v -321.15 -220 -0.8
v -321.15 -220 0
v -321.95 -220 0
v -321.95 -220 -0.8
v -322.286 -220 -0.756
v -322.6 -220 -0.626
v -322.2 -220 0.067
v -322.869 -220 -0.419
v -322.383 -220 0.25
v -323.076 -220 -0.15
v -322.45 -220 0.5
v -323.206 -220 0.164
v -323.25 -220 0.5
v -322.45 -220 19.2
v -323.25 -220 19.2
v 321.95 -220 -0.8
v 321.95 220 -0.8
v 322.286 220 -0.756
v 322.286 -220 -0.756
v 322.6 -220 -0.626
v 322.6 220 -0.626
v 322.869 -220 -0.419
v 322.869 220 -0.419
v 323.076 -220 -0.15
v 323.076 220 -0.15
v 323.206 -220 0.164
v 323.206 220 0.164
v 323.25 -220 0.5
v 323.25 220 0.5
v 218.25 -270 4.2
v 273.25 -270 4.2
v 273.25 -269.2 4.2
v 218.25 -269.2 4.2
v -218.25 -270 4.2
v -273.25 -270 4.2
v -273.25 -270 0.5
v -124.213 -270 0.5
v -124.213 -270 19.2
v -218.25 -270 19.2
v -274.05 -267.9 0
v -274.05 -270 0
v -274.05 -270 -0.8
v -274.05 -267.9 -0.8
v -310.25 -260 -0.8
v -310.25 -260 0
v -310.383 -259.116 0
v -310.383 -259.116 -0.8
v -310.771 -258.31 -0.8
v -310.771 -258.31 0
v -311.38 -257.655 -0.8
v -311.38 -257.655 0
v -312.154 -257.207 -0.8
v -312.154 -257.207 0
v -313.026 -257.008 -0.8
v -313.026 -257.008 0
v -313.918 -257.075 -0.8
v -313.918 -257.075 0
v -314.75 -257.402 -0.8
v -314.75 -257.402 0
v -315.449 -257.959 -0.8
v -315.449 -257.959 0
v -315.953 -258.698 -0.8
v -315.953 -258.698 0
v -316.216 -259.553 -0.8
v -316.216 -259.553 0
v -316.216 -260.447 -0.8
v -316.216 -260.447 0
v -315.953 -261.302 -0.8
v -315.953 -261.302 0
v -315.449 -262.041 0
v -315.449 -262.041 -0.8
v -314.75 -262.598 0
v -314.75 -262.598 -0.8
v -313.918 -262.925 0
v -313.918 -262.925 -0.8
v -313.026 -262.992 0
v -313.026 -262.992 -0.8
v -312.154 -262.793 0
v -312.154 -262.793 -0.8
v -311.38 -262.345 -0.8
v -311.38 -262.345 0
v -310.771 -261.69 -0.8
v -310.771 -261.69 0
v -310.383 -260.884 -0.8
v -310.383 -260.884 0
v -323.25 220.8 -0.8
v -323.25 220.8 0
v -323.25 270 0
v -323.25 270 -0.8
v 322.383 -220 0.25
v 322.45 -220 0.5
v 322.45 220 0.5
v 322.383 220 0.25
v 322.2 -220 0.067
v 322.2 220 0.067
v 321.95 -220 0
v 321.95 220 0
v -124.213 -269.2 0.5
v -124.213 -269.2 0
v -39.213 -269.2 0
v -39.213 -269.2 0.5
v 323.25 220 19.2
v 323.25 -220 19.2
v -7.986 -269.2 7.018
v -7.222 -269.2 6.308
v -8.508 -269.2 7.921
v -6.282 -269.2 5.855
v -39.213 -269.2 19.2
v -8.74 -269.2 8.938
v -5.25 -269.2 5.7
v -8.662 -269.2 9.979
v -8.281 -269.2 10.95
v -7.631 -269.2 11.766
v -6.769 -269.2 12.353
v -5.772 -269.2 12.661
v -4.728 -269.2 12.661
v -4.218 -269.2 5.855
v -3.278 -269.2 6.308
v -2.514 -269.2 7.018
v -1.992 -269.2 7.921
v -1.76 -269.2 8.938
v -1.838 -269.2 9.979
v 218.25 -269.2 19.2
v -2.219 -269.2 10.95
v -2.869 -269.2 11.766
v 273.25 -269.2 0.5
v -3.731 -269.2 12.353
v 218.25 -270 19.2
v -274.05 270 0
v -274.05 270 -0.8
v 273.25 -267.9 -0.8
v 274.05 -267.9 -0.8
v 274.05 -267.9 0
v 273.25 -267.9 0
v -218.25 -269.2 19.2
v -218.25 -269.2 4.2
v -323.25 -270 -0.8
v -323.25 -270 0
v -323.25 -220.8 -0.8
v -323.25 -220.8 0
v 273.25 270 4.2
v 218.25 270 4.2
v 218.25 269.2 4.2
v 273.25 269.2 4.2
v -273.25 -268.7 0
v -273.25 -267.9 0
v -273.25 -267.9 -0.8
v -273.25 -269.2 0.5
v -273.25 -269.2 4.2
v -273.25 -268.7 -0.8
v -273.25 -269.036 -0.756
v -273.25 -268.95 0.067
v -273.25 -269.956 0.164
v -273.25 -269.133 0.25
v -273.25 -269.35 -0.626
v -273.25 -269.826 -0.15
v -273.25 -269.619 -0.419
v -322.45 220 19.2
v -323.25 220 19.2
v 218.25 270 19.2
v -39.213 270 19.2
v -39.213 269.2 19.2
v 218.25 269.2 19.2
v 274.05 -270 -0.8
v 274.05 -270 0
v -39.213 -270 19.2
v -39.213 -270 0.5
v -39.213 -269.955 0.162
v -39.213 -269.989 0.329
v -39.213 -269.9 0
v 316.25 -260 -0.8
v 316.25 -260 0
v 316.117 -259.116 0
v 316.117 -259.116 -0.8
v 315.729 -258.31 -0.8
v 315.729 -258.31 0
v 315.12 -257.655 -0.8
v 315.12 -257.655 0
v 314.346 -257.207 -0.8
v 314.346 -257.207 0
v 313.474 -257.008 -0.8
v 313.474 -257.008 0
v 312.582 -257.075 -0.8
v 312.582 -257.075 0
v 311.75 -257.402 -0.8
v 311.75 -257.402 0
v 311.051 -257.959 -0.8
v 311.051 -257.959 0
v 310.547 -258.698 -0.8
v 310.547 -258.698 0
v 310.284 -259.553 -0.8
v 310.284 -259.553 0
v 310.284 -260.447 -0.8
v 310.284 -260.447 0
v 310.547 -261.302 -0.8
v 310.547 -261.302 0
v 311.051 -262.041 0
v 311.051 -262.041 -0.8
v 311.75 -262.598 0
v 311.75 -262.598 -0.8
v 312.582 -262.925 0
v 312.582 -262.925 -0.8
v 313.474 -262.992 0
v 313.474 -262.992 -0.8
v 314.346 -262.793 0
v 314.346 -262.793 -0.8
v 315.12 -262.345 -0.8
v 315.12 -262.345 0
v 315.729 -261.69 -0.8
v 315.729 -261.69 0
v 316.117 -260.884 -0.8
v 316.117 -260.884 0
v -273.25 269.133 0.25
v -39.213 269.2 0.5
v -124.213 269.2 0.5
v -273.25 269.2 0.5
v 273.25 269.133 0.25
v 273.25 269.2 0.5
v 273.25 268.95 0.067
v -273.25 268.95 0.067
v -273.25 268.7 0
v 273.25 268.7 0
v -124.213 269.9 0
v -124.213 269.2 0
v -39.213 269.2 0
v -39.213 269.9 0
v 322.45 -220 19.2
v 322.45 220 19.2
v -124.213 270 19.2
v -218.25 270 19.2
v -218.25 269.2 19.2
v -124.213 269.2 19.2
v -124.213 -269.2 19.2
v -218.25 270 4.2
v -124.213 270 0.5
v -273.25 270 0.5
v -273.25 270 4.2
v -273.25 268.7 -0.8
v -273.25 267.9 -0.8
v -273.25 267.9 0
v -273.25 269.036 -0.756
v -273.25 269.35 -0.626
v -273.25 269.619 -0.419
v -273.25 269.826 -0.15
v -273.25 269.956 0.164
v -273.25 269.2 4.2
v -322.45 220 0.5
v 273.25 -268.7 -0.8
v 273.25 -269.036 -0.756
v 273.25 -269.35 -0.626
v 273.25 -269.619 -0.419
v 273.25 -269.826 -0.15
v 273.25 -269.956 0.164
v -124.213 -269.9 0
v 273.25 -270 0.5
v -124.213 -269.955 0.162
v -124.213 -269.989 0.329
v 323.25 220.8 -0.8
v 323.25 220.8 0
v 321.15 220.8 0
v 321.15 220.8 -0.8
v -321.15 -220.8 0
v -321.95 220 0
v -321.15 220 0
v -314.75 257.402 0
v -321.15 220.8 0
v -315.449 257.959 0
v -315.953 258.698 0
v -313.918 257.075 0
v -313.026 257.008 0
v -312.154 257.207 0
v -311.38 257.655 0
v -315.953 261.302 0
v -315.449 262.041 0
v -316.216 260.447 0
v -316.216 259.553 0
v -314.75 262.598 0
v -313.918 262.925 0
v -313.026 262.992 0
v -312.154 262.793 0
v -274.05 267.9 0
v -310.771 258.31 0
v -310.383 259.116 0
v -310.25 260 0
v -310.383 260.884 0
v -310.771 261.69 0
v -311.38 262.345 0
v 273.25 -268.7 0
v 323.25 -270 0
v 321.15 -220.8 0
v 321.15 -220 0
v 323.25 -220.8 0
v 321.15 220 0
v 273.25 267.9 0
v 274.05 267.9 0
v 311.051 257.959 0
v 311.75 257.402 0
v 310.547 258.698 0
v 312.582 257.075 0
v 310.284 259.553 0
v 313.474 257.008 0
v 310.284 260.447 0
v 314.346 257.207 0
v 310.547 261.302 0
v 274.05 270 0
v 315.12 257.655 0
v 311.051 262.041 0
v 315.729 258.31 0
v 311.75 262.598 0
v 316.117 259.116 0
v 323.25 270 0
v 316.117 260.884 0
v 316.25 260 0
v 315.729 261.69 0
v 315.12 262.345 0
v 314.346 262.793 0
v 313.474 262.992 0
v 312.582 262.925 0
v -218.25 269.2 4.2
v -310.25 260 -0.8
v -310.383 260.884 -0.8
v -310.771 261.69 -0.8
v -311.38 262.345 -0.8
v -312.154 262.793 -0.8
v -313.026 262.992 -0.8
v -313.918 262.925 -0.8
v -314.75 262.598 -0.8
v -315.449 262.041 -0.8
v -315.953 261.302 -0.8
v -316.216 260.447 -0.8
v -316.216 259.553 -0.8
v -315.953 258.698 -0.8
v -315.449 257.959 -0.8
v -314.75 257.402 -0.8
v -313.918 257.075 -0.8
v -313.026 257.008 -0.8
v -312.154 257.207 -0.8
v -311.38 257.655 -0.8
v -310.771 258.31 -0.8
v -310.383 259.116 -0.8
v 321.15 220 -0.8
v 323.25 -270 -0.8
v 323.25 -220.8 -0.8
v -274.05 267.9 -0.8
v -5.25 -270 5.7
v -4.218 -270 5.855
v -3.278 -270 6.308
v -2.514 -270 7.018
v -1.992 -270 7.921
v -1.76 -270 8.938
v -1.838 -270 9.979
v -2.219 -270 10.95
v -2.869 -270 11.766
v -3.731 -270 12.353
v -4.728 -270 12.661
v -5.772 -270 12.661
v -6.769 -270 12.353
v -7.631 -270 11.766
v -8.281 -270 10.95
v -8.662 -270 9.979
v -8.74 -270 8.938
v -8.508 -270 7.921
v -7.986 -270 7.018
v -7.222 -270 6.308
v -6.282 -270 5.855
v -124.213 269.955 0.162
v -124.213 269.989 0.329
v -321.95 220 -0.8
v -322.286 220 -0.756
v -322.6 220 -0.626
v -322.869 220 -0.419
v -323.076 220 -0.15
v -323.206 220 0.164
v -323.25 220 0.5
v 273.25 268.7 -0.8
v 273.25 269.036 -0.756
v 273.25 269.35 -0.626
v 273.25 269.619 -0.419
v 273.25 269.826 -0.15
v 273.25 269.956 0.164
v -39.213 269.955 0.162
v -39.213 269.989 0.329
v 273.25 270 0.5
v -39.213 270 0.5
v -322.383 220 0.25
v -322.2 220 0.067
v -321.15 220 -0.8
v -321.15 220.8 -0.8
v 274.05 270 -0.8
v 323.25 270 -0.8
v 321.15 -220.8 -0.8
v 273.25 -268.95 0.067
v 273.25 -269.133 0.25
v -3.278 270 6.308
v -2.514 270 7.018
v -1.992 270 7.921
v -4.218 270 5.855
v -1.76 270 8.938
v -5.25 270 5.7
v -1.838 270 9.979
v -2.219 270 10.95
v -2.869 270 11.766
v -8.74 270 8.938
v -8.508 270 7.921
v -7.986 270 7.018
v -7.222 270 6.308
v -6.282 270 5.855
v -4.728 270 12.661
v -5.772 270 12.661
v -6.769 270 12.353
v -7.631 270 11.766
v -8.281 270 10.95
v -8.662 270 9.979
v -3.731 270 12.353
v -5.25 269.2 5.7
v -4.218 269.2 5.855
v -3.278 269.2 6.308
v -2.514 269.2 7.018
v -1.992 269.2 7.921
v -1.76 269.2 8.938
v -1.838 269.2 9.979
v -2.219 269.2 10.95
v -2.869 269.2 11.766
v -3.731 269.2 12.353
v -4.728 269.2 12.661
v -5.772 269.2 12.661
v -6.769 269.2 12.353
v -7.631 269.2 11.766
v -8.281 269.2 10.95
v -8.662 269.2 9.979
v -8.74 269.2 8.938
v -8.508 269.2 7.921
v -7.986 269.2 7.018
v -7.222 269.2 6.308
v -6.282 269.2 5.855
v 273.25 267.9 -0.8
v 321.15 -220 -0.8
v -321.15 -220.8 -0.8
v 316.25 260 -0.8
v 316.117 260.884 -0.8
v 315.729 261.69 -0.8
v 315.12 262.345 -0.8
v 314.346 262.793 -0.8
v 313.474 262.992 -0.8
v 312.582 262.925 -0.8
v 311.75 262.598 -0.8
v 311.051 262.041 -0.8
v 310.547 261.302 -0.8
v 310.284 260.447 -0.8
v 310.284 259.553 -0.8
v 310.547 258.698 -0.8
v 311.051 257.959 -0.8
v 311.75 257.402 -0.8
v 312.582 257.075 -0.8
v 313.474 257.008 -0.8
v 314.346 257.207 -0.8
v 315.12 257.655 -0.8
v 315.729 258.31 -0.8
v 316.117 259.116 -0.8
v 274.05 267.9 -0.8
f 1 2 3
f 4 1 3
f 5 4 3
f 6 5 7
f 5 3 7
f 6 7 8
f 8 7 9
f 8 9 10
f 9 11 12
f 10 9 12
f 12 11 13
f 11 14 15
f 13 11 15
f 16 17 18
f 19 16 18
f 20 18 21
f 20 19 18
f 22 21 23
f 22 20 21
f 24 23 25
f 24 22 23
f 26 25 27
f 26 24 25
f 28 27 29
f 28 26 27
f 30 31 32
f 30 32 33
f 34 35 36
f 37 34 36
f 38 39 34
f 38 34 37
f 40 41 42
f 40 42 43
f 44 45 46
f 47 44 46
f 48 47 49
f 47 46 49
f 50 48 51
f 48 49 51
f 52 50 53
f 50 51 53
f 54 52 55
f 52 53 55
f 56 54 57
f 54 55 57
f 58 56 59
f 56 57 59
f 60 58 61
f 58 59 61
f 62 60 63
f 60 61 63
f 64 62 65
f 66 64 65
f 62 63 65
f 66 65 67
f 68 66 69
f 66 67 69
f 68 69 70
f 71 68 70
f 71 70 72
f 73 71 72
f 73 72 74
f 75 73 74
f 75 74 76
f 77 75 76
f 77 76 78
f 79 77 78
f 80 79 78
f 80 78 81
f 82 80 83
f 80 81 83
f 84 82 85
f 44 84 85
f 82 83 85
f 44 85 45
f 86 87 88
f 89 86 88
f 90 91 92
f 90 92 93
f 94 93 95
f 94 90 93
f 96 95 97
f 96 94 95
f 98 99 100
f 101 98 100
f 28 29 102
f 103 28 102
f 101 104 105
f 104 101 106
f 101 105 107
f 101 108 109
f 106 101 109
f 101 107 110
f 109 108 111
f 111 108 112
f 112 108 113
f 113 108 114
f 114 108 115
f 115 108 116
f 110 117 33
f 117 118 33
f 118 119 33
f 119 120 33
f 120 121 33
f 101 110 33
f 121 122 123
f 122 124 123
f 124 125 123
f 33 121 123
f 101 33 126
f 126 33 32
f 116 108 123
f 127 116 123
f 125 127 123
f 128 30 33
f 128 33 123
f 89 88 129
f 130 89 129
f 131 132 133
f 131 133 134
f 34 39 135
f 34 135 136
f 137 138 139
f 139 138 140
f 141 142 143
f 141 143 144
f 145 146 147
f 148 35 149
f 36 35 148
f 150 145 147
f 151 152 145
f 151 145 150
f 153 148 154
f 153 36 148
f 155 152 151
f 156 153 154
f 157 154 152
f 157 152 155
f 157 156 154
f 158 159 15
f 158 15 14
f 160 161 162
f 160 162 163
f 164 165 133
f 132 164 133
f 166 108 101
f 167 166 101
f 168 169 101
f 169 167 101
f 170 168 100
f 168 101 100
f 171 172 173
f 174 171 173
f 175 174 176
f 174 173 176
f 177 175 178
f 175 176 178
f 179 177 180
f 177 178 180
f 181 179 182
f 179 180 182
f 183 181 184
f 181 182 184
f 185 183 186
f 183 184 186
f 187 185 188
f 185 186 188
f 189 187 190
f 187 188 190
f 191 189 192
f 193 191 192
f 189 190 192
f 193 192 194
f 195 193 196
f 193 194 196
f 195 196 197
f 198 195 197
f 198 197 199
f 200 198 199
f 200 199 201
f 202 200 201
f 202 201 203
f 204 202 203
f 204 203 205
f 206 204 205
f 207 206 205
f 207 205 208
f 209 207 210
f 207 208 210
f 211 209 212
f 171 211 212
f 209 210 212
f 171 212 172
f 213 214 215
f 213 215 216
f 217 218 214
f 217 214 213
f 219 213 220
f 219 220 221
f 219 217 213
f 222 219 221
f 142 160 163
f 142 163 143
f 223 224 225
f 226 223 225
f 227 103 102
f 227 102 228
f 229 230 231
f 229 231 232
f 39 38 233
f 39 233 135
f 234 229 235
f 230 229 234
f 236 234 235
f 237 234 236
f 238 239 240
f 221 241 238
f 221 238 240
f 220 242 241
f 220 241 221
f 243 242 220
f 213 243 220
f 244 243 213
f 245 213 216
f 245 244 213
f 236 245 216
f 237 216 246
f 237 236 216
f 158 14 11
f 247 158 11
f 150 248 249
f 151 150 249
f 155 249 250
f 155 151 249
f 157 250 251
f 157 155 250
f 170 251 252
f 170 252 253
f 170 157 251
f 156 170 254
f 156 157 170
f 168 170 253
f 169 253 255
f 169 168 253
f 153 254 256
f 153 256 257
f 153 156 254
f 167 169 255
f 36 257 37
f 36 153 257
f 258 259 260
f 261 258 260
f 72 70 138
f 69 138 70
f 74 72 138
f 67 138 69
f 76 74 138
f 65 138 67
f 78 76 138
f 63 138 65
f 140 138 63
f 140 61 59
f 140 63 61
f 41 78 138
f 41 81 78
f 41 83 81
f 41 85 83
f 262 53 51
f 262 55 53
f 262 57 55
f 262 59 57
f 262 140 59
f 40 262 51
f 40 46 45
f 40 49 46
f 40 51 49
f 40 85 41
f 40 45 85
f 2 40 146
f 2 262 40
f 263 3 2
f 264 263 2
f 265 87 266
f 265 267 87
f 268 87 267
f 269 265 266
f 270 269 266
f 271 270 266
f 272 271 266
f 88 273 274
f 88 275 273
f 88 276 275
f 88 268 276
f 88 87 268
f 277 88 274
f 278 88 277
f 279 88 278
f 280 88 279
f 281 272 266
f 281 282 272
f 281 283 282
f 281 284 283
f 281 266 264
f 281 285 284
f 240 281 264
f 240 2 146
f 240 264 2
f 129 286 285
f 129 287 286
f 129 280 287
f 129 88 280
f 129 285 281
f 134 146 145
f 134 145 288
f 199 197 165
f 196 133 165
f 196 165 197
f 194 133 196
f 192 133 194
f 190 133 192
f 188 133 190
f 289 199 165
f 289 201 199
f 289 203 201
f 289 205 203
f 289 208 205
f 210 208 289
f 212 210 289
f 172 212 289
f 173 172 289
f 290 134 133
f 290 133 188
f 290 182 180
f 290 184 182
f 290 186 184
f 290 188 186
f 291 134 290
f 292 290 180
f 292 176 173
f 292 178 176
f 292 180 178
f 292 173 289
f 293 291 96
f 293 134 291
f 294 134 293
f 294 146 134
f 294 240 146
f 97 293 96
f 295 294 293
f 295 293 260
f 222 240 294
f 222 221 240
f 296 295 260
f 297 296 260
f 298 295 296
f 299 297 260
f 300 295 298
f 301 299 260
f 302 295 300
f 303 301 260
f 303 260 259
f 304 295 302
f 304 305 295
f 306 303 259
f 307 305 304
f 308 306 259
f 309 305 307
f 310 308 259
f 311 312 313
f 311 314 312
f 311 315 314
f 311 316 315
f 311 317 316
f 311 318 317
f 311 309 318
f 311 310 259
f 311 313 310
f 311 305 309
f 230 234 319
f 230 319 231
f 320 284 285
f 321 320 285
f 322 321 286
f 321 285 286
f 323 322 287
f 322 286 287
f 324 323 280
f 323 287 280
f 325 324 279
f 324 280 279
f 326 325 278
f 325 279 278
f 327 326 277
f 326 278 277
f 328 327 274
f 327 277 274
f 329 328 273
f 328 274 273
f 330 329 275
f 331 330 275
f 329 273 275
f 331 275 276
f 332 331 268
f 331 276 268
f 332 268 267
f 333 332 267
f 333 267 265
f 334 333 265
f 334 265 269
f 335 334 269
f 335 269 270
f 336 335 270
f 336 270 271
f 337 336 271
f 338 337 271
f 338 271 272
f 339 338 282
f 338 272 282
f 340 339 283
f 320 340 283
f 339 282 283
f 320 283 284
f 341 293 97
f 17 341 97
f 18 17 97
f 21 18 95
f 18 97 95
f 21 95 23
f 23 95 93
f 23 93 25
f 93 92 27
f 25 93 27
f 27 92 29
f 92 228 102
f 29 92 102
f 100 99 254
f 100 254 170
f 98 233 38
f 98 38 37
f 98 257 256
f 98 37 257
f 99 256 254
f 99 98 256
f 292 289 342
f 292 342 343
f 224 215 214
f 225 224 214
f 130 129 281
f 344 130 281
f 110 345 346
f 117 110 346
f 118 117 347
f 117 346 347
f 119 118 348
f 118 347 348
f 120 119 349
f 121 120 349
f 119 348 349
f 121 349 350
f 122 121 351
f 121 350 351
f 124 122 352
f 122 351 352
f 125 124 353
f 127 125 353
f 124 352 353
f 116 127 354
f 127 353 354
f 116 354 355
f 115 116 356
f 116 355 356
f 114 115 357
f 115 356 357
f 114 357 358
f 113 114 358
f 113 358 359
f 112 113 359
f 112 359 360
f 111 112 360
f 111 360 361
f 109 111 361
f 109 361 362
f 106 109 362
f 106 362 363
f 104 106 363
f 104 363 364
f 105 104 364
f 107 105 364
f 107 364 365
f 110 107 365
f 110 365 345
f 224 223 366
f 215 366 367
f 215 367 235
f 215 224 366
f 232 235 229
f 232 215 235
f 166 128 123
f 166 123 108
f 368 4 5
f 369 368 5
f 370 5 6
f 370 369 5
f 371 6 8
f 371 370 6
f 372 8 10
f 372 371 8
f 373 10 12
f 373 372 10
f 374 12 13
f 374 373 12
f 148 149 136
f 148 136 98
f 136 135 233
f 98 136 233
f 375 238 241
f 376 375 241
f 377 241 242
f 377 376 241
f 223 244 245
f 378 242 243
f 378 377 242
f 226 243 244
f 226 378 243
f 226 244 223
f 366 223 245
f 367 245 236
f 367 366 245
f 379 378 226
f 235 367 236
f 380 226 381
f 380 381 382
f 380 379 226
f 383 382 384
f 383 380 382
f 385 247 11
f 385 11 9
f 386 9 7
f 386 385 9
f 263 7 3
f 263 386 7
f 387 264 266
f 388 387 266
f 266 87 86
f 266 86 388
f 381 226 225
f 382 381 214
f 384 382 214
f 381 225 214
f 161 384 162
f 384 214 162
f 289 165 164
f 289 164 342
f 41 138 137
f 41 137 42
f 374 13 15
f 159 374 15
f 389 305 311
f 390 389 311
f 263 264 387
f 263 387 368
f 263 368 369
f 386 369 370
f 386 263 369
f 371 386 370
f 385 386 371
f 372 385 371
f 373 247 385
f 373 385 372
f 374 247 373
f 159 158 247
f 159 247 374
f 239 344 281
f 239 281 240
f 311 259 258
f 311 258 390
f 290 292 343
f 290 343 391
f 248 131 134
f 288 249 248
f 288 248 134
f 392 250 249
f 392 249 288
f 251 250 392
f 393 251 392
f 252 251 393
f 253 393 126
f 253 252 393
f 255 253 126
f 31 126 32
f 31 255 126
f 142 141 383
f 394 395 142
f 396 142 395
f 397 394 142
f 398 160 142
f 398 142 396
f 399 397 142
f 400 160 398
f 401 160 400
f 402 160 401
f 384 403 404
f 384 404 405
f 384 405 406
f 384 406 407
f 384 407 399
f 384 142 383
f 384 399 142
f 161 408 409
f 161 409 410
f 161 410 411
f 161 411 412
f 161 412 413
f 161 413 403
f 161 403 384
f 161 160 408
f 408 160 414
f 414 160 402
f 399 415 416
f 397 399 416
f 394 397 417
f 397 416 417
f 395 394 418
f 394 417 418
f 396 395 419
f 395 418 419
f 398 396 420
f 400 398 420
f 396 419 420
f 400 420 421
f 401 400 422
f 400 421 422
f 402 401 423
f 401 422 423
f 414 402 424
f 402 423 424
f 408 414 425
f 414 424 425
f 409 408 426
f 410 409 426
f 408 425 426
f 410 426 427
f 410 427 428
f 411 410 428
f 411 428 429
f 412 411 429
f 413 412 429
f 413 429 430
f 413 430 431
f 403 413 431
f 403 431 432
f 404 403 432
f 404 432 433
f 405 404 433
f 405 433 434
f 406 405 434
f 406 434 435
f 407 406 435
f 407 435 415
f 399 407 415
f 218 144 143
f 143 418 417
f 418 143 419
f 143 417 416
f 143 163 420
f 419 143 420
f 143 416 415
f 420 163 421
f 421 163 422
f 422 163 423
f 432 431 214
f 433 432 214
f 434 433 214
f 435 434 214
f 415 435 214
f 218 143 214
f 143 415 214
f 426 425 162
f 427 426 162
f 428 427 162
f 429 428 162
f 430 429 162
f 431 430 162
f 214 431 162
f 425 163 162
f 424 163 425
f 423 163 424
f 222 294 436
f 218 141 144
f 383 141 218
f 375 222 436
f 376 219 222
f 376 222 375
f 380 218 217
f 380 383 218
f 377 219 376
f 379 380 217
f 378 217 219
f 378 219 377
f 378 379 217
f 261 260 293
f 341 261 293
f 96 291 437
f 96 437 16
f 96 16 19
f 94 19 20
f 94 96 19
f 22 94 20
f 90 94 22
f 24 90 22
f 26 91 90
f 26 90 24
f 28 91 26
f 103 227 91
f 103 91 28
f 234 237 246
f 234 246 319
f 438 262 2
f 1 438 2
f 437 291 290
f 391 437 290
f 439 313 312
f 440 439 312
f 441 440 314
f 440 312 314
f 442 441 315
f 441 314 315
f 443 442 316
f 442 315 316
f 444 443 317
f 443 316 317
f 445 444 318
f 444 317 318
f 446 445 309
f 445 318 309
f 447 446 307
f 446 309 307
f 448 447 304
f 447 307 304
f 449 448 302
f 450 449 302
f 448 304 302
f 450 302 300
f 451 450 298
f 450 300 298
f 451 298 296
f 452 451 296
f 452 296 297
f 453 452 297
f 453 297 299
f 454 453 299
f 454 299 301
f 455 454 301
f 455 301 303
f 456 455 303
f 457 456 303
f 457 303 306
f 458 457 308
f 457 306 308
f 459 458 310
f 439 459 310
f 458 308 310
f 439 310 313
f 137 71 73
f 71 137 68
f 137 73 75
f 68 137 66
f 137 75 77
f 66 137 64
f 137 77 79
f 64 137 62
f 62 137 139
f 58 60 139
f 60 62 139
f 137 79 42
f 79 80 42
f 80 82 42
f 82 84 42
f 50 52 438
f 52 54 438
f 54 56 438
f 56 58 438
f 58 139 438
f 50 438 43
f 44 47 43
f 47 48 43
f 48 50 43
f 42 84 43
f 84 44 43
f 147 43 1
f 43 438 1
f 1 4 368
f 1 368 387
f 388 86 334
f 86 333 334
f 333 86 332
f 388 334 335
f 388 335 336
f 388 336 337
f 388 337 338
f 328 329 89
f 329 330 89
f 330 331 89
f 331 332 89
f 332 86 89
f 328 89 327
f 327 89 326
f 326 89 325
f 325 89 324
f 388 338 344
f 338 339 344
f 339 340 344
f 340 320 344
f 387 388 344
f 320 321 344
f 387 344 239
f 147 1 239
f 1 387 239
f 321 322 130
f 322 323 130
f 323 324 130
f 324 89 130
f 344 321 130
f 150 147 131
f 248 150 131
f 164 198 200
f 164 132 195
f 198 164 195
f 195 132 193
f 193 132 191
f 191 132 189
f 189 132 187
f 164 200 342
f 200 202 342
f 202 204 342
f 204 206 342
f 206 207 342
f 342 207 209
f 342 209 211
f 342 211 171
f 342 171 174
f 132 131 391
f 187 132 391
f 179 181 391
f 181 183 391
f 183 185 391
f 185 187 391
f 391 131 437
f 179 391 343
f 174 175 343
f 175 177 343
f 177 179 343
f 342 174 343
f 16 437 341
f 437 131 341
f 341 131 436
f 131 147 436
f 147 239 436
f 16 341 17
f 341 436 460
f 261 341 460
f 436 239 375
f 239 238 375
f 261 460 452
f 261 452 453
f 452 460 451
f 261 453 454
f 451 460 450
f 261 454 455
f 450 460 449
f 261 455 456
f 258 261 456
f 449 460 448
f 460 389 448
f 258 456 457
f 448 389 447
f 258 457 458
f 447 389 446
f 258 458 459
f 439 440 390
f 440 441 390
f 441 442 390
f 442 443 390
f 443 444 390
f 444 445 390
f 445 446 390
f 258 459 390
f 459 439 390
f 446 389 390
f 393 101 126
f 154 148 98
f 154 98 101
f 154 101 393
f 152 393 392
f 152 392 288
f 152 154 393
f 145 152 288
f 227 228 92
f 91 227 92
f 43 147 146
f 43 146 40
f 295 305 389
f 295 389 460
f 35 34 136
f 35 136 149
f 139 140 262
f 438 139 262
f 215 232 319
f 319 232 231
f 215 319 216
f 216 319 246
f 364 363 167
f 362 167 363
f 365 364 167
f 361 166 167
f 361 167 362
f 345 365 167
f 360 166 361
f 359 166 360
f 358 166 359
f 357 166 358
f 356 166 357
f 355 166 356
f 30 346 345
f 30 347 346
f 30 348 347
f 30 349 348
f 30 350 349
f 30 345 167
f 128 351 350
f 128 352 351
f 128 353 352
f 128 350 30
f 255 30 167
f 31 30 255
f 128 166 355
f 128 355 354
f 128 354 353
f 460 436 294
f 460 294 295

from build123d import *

# Parameters (mm, degrees)
SKETCH_1_W                        = 646.5
SKETCH_1_H                        = 540
SKETCH_1_R                        = 3
SM_BASE_FLANGE_1_DEPTH            = 0.8
SM_EDGE_FLANGE_1_STRIP_W          = 4.2
SM_EDGE_FLANGE_1_STRIP_H          = 0.8
SM_EDGE_FLANGE_1_STRIP_CUT_DEPTH  = 440
SM_EDGE_FLANGE_1_RELIEF_W         = 5
SM_EDGE_FLANGE_1_RELIEF_H         = 0.8
SM_EDGE_FLANGE_1_RELIEF_CUT_DEPTH = 0.8
SM_EDGE_FLANGE_1_DEPTH            = 440
SM_EDGE_FLANGE_2_STRIP_W          = 4.2
SM_EDGE_FLANGE_2_STRIP_H          = 0.8
SM_EDGE_FLANGE_2_STRIP_CUT_DEPTH  = 440
SM_EDGE_FLANGE_2_RELIEF_W         = 5
SM_EDGE_FLANGE_2_RELIEF_H         = 0.8
SM_EDGE_FLANGE_2_RELIEF_CUT_DEPTH = 0.8
SM_EDGE_FLANGE_2_DEPTH            = 440
SM_EDGE_FLANGE_3_STRIP_W          = 4.2
SM_EDGE_FLANGE_3_STRIP_H          = 0.8
SM_EDGE_FLANGE_3_STRIP_CUT_DEPTH  = 546.5
SM_EDGE_FLANGE_3_RELIEF_W         = 5
SM_EDGE_FLANGE_3_RELIEF_H         = 0.8
SM_EDGE_FLANGE_3_RELIEF_CUT_DEPTH = 0.8
SM_EDGE_FLANGE_3_DEPTH            = 546.5
SM_EDGE_FLANGE_3_FLAT_DEPTH       = 0.8
SM_EDGE_FLANGE_4_STRIP_W          = 4.2
SM_EDGE_FLANGE_4_STRIP_H          = 0.8
SM_EDGE_FLANGE_4_STRIP_CUT_DEPTH  = 546.5
SM_EDGE_FLANGE_4_RELIEF_W         = 5
SM_EDGE_FLANGE_4_RELIEF_H         = 0.8
SM_EDGE_FLANGE_4_RELIEF_CUT_DEPTH = 0.8
SM_EDGE_FLANGE_4_DEPTH            = 546.5
SM_EDGE_FLANGE_4_FLAT_DEPTH       = 0.8
SKETCH_18_W                       = 85
SKETCH_18_H                       = 42.323448133
CUT_EXTRUDE_1_DEPTH               = 629.964102712
SKETCH_19_W                       = 85
SKETCH_19_H                       = 50.946353984
CUT_EXTRUDE_2_DEPTH               = 629.964102712
SKETCH_20_R                       = 3.5
CUT_EXTRUDE_3_DEPTH               = 630.650063527


# Sheet-metal steps are written as plain solids
with BuildPart() as part:
    # Sketch 1 → 基体-法兰1 (new body)
    with BuildSketch(Plane.XY):
        Rectangle(SKETCH_1_W, SKETCH_1_H)
        with Locations((313.25, 260)):
            Circle(SKETCH_1_R, mode=Mode.SUBTRACT)
        with Locations((-313.25, 260)):
            Circle(SKETCH_1_R, mode=Mode.SUBTRACT)
        with Locations((-313.25, -260)):
            Circle(SKETCH_1_R, mode=Mode.SUBTRACT)
        with Locations((313.25, -260)):
            Circle(SKETCH_1_R, mode=Mode.SUBTRACT)
    extrude(amount=-SM_BASE_FLANGE_1_DEPTH)

    # 边线-法兰1 strip (across the edge) → 边线-法兰1 strip cut (cut)
    with BuildSketch(Plane(origin=(323.25, -220, 0), x_dir=(-1, 0, 0), z_dir=(0, 1, 0))):
        with Locations((-0.8, -0.4)):
            Rectangle(SM_EDGE_FLANGE_1_STRIP_W, SM_EDGE_FLANGE_1_STRIP_H)
    extrude(amount=SM_EDGE_FLANGE_1_STRIP_CUT_DEPTH, mode=Mode.SUBTRACT)

    # 边线-法兰1 relief (on the sheet) → 边线-法兰1 relief cut (cut)
    with BuildSketch(Plane(origin=(321.95, -220, 0), x_dir=(-1, 0, 0), z_dir=(0, 0, 1))):
        with Locations((-1.7, 0.4)):
            Rectangle(SM_EDGE_FLANGE_1_RELIEF_W, SM_EDGE_FLANGE_1_RELIEF_H)
        with Locations((-1.7, -440.4)):
            Rectangle(SM_EDGE_FLANGE_1_RELIEF_W, SM_EDGE_FLANGE_1_RELIEF_H)
    extrude(amount=-SM_EDGE_FLANGE_1_RELIEF_CUT_DEPTH, mode=Mode.SUBTRACT)

    # 边线-法兰1 section (across the edge) → 边线-法兰1 (add)
    with BuildSketch(Plane(origin=(323.25, -220, 0), x_dir=(-1, 0, 0), z_dir=(0, 1, 0))):
        with BuildLine():
            Line((0, 0.5), (0, 19.2))
            Line((0, 19.2), (0.8, 19.2))
            Line((0.8, 19.2), (0.8, 0.5))
            ThreePointArc((0.8, 0.5), (0.946446609, 0.146446609), (1.3, 0))
            Line((1.3, 0), (1.3, -0.8))
            ThreePointArc((1.3, -0.8), (0.380761184, -0.419238816), (0, 0.5))
        make_face()
    extrude(amount=SM_EDGE_FLANGE_1_DEPTH)

    # 边线-法兰2 strip (across the edge) → 边线-法兰2 strip cut (cut)
    with BuildSketch(Plane(origin=(-323.25, 220, 0), x_dir=(1, 0, 0), z_dir=(0, -1, 0))):
        with Locations((-0.8, -0.4)):
            Rectangle(SM_EDGE_FLANGE_2_STRIP_W, SM_EDGE_FLANGE_2_STRIP_H)
    extrude(amount=SM_EDGE_FLANGE_2_STRIP_CUT_DEPTH, mode=Mode.SUBTRACT)

    # 边线-法兰2 relief (on the sheet) → 边线-法兰2 relief cut (cut)
    with BuildSketch(Plane(origin=(-321.95, 220, 0), x_dir=(1, 0, 0), z_dir=(0, 0, 1))):
        with Locations((-1.7, 0.4)):
            Rectangle(SM_EDGE_FLANGE_2_RELIEF_W, SM_EDGE_FLANGE_2_RELIEF_H)
        with Locations((-1.7, -440.4)):
            Rectangle(SM_EDGE_FLANGE_2_RELIEF_W, SM_EDGE_FLANGE_2_RELIEF_H)
    extrude(amount=-SM_EDGE_FLANGE_2_RELIEF_CUT_DEPTH, mode=Mode.SUBTRACT)

    # 边线-法兰2 section (across the edge) → 边线-法兰2 (add)
    with BuildSketch(Plane(origin=(-323.25, 220, 0), x_dir=(1, 0, 0), z_dir=(0, -1, 0))):
        with BuildLine():
            Line((0, 0.5), (0, 19.2))
            Line((0, 19.2), (0.8, 19.2))
            Line((0.8, 19.2), (0.8, 0.5))
            ThreePointArc((0.8, 0.5), (0.946446609, 0.146446609), (1.3, 0))
            Line((1.3, 0), (1.3, -0.8))
            ThreePointArc((1.3, -0.8), (0.380761184, -0.419238816), (0, 0.5))
        make_face()
    extrude(amount=SM_EDGE_FLANGE_2_DEPTH)

    # 边线-法兰3 strip (across the edge) → 边线-法兰3 strip cut (cut)
    with BuildSketch(Plane(origin=(-273.25, -270, 0), x_dir=(0, 1, 0), z_dir=(1, 0, 0))):
        with Locations((-0.8, -0.4)):
            Rectangle(SM_EDGE_FLANGE_3_STRIP_W, SM_EDGE_FLANGE_3_STRIP_H)
    extrude(amount=SM_EDGE_FLANGE_3_STRIP_CUT_DEPTH, mode=Mode.SUBTRACT)

    # 边线-法兰3 relief (on the sheet) → 边线-法兰3 relief cut (cut)
    with BuildSketch(Plane(origin=(-273.25, -268.7, 0), x_dir=(0, 1, 0), z_dir=(0, 0, 1))):
        with Locations((-1.7, 0.4)):
            Rectangle(SM_EDGE_FLANGE_3_RELIEF_W, SM_EDGE_FLANGE_3_RELIEF_H)
        with Locations((-1.7, -546.9)):
            Rectangle(SM_EDGE_FLANGE_3_RELIEF_W, SM_EDGE_FLANGE_3_RELIEF_H)
    extrude(amount=-SM_EDGE_FLANGE_3_RELIEF_CUT_DEPTH, mode=Mode.SUBTRACT)

    # 边线-法兰3 bend section (across the edge) → 边线-法兰3 (add)
    with BuildSketch(Plane(origin=(-273.25, -270, 0), x_dir=(0, 1, 0), z_dir=(1, 0, 0))):
        with BuildLine():
            Line((0, 0.5), (0.8, 0.5))
            ThreePointArc((0.8, 0.5), (0.946446609, 0.146446609), (1.3, 0))
            Line((1.3, 0), (1.3, -0.8))
            ThreePointArc((1.3, -0.8), (0.380761184, -0.419238816), (0, 0.5))
        make_face()
    extrude(amount=SM_EDGE_FLANGE_3_DEPTH)

    # 边线-法兰3 profile (on flange) → 边线-法兰3 flat (add)
    with BuildSketch(Plane.XZ.offset(270)):
        Polygon((-273.25, 0.5), (273.25, 0.5), (273.25, 4.2), (218.25, 4.2), (218.25, 19.2), (-218.25, 19.2), (-218.25, 4.2), (-273.25, 4.2), align=None)
    extrude(amount=-SM_EDGE_FLANGE_3_FLAT_DEPTH)

    # 边线-法兰4 strip (across the edge) → 边线-法兰4 strip cut (cut)
    with BuildSketch(Plane(origin=(273.25, 270, 0), x_dir=(0, -1, 0), z_dir=(-1, 0, 0))):
        with Locations((-0.8, -0.4)):
            Rectangle(SM_EDGE_FLANGE_4_STRIP_W, SM_EDGE_FLANGE_4_STRIP_H)
    extrude(amount=SM_EDGE_FLANGE_4_STRIP_CUT_DEPTH, mode=Mode.SUBTRACT)

    # 边线-法兰4 relief (on the sheet) → 边线-法兰4 relief cut (cut)
    with BuildSketch(Plane(origin=(273.25, 268.7, 0), x_dir=(0, -1, 0), z_dir=(0, 0, 1))):
        with Locations((-1.7, 0.4)):
            Rectangle(SM_EDGE_FLANGE_4_RELIEF_W, SM_EDGE_FLANGE_4_RELIEF_H)
        with Locations((-1.7, -546.9)):
            Rectangle(SM_EDGE_FLANGE_4_RELIEF_W, SM_EDGE_FLANGE_4_RELIEF_H)
    extrude(amount=-SM_EDGE_FLANGE_4_RELIEF_CUT_DEPTH, mode=Mode.SUBTRACT)

    # 边线-法兰4 bend section (across the edge) → 边线-法兰4 (add)
    with BuildSketch(Plane(origin=(273.25, 270, 0), x_dir=(0, -1, 0), z_dir=(-1, 0, 0))):
        with BuildLine():
            Line((0, 0.5), (0.8, 0.5))
            ThreePointArc((0.8, 0.5), (0.946446609, 0.146446609), (1.3, 0))
            Line((1.3, 0), (1.3, -0.8))
            ThreePointArc((1.3, -0.8), (0.380761184, -0.419238816), (0, 0.5))
        make_face()
    extrude(amount=SM_EDGE_FLANGE_4_DEPTH)

    # 边线-法兰4 profile (on flange) → 边线-法兰4 flat (add)
    with BuildSketch(Plane(origin=(0, 270, 0), x_dir=(-1, 0, 0), z_dir=(0, 1, 0))):
        Polygon((-273.25, 0.5), (273.25, 0.5), (273.25, 4.2), (218.25, 4.2), (218.25, 19.2), (-218.25, 19.2), (-218.25, 4.2), (-273.25, 4.2), align=None)
    extrude(amount=-SM_EDGE_FLANGE_4_FLAT_DEPTH)

    # 草图18 → 切除-拉伸1 (cut, through all)
    with BuildSketch(Plane(origin=(0, -269.2, 0), x_dir=(1, 0, 0), z_dir=(0, 1, 0))):
        with Locations((-81.712681962, -21.161724066)):
            Rectangle(SKETCH_18_W, SKETCH_18_H)
    extrude(amount=-CUT_EXTRUDE_1_DEPTH, mode=Mode.SUBTRACT)

    # 草图19 → 切除-拉伸2 (cut, through all)
    with BuildSketch(Plane.XZ.offset(-269.2)):
        with Locations((-81.712681962, 25.473176992)):
            Rectangle(SKETCH_19_W, SKETCH_19_H)
    extrude(amount=-CUT_EXTRUDE_2_DEPTH, mode=Mode.SUBTRACT)

    # 草图20 → 切除-拉伸3 (cut, through all)
    with BuildSketch(Plane(origin=(0, -270, 0), x_dir=(-1, 0, 0), z_dir=(0, -1, 0))):
        with Locations(Location((5.25, -9.2, 0), (0, 0, 90))):
            Circle(SKETCH_20_R)
    extrude(amount=-CUT_EXTRUDE_3_DEPTH, mode=Mode.SUBTRACT)


solid = part.part
